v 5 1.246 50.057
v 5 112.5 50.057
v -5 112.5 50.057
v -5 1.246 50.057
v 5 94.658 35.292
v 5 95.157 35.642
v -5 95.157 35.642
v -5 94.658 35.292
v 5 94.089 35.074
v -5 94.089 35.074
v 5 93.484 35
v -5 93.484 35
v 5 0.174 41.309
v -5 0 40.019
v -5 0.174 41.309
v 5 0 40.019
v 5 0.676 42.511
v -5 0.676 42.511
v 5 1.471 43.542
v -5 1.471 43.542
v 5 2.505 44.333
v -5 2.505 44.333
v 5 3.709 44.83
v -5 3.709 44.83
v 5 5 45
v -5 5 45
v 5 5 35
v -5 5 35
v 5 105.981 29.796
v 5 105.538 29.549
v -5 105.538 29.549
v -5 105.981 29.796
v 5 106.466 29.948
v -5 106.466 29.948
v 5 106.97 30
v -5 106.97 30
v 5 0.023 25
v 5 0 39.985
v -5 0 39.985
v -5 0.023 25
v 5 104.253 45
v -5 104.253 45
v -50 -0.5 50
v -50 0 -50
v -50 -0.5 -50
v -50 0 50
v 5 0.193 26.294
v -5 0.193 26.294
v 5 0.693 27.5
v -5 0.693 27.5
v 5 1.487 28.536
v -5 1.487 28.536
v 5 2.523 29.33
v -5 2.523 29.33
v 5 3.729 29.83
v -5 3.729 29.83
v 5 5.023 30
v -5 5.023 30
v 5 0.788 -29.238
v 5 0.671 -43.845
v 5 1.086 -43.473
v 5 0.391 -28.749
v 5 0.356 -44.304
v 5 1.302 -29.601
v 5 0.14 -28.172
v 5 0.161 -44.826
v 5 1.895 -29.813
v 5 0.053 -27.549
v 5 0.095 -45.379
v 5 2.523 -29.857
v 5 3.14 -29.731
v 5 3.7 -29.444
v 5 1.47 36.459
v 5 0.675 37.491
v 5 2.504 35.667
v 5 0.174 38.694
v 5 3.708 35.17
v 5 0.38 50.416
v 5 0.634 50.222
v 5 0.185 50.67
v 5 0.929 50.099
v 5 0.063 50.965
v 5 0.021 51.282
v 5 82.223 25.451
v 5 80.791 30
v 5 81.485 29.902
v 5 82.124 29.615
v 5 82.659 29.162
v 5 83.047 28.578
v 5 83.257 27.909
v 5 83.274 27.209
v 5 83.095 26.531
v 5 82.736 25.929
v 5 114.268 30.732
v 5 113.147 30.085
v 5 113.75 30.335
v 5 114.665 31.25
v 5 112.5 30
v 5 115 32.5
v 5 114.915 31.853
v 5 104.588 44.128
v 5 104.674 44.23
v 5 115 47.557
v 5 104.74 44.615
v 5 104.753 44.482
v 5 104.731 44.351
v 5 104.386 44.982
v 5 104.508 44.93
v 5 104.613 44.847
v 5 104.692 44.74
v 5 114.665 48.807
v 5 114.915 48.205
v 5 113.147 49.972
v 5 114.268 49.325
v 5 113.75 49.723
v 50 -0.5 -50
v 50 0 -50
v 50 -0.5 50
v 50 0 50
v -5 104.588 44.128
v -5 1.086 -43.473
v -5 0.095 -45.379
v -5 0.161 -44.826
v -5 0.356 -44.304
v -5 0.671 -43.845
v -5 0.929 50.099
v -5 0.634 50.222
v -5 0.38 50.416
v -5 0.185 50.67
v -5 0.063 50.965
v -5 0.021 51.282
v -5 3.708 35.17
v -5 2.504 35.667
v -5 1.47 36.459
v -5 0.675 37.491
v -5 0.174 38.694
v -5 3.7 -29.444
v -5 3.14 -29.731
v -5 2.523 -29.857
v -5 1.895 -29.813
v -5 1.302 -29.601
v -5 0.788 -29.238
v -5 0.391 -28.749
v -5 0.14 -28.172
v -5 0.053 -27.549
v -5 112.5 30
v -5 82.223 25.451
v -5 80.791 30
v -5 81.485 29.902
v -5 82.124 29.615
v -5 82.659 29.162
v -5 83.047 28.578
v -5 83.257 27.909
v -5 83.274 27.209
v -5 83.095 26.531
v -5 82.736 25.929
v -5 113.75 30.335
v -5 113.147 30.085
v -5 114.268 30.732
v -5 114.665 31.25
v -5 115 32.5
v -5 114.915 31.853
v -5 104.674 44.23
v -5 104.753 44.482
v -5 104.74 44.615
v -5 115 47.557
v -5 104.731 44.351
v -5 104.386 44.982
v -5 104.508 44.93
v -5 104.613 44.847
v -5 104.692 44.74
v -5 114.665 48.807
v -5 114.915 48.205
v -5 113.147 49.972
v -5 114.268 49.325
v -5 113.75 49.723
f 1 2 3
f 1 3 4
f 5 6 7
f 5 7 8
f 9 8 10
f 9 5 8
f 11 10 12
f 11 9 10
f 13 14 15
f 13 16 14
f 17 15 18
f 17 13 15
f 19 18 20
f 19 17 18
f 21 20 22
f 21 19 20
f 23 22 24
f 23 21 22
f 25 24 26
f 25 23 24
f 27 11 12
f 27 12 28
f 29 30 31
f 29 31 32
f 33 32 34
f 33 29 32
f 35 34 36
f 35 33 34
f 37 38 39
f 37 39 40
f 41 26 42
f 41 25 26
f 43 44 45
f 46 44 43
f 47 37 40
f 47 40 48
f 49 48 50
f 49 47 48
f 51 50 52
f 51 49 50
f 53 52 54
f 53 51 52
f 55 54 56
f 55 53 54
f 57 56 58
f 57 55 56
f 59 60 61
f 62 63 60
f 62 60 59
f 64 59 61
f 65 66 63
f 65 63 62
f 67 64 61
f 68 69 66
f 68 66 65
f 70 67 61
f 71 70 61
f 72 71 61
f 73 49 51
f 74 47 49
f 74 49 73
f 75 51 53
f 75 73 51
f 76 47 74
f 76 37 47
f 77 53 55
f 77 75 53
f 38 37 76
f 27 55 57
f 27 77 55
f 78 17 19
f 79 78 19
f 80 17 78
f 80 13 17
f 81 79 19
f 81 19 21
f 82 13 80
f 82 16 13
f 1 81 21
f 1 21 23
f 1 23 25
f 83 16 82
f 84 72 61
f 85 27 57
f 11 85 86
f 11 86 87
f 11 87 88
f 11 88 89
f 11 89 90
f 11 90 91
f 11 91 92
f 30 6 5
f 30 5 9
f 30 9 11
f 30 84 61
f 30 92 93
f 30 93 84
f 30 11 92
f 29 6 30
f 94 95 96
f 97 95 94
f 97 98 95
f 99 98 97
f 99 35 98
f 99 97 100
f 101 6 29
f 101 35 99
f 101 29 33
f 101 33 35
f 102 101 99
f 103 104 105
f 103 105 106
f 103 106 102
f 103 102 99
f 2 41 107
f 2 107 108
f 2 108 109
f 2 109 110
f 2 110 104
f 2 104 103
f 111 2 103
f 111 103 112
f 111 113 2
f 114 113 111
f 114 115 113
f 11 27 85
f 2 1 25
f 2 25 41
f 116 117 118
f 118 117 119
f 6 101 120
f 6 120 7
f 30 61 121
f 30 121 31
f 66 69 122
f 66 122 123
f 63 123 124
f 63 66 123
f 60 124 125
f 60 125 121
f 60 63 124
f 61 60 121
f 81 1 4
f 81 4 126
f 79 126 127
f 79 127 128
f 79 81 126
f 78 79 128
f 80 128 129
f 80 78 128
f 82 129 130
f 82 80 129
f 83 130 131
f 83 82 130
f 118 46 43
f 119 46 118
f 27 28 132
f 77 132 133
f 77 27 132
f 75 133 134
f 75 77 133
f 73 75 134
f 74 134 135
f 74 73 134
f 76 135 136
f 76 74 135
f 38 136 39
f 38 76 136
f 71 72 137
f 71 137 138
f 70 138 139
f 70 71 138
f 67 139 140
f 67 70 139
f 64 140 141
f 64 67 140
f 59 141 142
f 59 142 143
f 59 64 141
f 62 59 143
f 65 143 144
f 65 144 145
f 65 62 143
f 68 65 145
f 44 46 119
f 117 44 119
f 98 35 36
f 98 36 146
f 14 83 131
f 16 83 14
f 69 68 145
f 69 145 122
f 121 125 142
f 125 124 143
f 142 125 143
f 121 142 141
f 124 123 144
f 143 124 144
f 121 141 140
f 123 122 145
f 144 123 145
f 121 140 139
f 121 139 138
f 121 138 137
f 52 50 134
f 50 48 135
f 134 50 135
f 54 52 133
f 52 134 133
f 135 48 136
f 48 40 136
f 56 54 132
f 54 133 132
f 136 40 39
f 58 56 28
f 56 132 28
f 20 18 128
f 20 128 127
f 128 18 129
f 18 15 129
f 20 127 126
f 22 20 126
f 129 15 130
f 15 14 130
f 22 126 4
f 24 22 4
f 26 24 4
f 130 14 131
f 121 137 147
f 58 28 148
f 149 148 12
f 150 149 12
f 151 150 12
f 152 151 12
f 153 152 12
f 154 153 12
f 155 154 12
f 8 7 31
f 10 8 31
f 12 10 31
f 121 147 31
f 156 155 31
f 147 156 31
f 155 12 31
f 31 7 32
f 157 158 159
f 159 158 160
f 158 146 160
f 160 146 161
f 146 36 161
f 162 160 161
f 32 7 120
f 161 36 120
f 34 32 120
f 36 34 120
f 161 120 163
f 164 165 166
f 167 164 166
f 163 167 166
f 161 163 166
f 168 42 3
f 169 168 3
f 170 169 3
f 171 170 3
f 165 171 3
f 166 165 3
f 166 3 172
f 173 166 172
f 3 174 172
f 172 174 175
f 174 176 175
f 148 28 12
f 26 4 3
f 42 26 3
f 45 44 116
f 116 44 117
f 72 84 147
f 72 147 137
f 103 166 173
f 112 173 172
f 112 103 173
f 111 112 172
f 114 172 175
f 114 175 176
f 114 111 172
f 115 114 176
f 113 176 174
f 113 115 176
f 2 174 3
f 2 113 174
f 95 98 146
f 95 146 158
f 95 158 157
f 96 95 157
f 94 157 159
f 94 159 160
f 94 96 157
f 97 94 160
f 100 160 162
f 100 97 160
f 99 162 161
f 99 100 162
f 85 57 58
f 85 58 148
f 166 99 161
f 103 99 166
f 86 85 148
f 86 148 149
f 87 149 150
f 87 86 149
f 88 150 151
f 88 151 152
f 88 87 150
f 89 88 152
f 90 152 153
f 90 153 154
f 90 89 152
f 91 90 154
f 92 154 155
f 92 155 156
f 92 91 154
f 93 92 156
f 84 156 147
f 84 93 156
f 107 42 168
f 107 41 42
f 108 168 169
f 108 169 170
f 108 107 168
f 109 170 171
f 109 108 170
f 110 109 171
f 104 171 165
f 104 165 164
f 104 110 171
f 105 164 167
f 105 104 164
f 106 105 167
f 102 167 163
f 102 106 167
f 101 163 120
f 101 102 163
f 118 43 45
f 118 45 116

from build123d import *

# Parameters (mm, degrees)
F4_DEPTH = 5
F0_W     = 100
F0_H     = 100
F6_DEPTH = 0.5


# Not quite as in the source:
# - the program builds the solid bodies; features that only make, move or delete a surface that nothing else refers to are left out


with BuildPart() as f4:
    # F1 (on Right) → F4 (new body, symmetric)
    with BuildSketch(Plane.YZ):
        with BuildLine():
            ThreePointArc((104.2533004827, 45), (104.7201177173, 44.6791135659), (104.5877536809, 44.128326678))
            Line((104.5877536809, 44.128326678), (95.1566060497, 35.6416333901))
            ThreePointArc((95.1566060497, 35.6416333901), (94.3799078888, 35.1659138271), (93.4843400592, 35))
            Line((93.4843400592, 35), (5, 35))
            ThreePointArc((5, 35), (1.4698085841, 36.4591316648), (2.27993e-05, 39.9849005732))
            Line((2.27993e-05, 39.9849005732), (0.0226491659, 25.0000171511))
            ThreePointArc((0.0226491659, 25.0000171511), (1.4871213238, 28.5355399698), (5.0226491659, 30))
            Line((5.0226491659, 30), (80.7907660618, 30))
            ThreePointArc((80.7907660618, 30), (83.1753398645, 28.2508713467), (82.2231725759, 25.4510462235))
            Line((82.2231725759, 25.4510462235), (3.7000322722, -29.44382694))
            ThreePointArc((3.7000322722, -29.44382694), (1.3024238225, -29.6010647183), (0.0526297849, -27.5489280609))
            Line((0.0526297849, -27.5489280609), (0.0953742048, -45.3789287217))
            ThreePointArc((0.0953742048, -45.3789287217), (0.3564868473, -44.3043555559), (1.0855882207, -43.4729119391))
            Line((1.0855882207, -43.4729119391), (105.5380785244, 29.5489537765))
            ThreePointArc((105.5380785244, 29.5489537765), (106.2196136918, 29.8845738027), (106.9704850386, 30))
            Line((106.9704850386, 30), (112.5, 30))
            ThreePointArc((112.5, 30), (114.267766953, 30.732233047), (115, 32.5))
            Line((115, 32.5), (115, 47.5574878287))
            ThreePointArc((115, 47.5574878287), (114.267766953, 49.3252547817), (112.5, 50.0574878287))
            Line((112.5, 50.0574878287), (1.2462358677, 50.0574878287))
            ThreePointArc((1.2462358677, 50.0574878287), (0.3800812524, 50.4162608175), (0.0213082636, 51.2824154329))
            Line((0.0213082636, 51.2824154329), (3.5669e-05, 40.018886193))
            ThreePointArc((3.5669e-05, 40.018886193), (1.471149689, 43.54220489), (5, 45))
            Line((5, 45), (104.2533004827, 45))
        make_face()
    extrude(amount=F4_DEPTH, both=True)


with BuildPart() as f6:
    # F0 (on Front) → F6 (new body)
    with BuildSketch(Plane.XZ):
        Rectangle(F0_W, F0_H)
    extrude(amount=F6_DEPTH)


solid = Compound([f4.part, f6.part])
